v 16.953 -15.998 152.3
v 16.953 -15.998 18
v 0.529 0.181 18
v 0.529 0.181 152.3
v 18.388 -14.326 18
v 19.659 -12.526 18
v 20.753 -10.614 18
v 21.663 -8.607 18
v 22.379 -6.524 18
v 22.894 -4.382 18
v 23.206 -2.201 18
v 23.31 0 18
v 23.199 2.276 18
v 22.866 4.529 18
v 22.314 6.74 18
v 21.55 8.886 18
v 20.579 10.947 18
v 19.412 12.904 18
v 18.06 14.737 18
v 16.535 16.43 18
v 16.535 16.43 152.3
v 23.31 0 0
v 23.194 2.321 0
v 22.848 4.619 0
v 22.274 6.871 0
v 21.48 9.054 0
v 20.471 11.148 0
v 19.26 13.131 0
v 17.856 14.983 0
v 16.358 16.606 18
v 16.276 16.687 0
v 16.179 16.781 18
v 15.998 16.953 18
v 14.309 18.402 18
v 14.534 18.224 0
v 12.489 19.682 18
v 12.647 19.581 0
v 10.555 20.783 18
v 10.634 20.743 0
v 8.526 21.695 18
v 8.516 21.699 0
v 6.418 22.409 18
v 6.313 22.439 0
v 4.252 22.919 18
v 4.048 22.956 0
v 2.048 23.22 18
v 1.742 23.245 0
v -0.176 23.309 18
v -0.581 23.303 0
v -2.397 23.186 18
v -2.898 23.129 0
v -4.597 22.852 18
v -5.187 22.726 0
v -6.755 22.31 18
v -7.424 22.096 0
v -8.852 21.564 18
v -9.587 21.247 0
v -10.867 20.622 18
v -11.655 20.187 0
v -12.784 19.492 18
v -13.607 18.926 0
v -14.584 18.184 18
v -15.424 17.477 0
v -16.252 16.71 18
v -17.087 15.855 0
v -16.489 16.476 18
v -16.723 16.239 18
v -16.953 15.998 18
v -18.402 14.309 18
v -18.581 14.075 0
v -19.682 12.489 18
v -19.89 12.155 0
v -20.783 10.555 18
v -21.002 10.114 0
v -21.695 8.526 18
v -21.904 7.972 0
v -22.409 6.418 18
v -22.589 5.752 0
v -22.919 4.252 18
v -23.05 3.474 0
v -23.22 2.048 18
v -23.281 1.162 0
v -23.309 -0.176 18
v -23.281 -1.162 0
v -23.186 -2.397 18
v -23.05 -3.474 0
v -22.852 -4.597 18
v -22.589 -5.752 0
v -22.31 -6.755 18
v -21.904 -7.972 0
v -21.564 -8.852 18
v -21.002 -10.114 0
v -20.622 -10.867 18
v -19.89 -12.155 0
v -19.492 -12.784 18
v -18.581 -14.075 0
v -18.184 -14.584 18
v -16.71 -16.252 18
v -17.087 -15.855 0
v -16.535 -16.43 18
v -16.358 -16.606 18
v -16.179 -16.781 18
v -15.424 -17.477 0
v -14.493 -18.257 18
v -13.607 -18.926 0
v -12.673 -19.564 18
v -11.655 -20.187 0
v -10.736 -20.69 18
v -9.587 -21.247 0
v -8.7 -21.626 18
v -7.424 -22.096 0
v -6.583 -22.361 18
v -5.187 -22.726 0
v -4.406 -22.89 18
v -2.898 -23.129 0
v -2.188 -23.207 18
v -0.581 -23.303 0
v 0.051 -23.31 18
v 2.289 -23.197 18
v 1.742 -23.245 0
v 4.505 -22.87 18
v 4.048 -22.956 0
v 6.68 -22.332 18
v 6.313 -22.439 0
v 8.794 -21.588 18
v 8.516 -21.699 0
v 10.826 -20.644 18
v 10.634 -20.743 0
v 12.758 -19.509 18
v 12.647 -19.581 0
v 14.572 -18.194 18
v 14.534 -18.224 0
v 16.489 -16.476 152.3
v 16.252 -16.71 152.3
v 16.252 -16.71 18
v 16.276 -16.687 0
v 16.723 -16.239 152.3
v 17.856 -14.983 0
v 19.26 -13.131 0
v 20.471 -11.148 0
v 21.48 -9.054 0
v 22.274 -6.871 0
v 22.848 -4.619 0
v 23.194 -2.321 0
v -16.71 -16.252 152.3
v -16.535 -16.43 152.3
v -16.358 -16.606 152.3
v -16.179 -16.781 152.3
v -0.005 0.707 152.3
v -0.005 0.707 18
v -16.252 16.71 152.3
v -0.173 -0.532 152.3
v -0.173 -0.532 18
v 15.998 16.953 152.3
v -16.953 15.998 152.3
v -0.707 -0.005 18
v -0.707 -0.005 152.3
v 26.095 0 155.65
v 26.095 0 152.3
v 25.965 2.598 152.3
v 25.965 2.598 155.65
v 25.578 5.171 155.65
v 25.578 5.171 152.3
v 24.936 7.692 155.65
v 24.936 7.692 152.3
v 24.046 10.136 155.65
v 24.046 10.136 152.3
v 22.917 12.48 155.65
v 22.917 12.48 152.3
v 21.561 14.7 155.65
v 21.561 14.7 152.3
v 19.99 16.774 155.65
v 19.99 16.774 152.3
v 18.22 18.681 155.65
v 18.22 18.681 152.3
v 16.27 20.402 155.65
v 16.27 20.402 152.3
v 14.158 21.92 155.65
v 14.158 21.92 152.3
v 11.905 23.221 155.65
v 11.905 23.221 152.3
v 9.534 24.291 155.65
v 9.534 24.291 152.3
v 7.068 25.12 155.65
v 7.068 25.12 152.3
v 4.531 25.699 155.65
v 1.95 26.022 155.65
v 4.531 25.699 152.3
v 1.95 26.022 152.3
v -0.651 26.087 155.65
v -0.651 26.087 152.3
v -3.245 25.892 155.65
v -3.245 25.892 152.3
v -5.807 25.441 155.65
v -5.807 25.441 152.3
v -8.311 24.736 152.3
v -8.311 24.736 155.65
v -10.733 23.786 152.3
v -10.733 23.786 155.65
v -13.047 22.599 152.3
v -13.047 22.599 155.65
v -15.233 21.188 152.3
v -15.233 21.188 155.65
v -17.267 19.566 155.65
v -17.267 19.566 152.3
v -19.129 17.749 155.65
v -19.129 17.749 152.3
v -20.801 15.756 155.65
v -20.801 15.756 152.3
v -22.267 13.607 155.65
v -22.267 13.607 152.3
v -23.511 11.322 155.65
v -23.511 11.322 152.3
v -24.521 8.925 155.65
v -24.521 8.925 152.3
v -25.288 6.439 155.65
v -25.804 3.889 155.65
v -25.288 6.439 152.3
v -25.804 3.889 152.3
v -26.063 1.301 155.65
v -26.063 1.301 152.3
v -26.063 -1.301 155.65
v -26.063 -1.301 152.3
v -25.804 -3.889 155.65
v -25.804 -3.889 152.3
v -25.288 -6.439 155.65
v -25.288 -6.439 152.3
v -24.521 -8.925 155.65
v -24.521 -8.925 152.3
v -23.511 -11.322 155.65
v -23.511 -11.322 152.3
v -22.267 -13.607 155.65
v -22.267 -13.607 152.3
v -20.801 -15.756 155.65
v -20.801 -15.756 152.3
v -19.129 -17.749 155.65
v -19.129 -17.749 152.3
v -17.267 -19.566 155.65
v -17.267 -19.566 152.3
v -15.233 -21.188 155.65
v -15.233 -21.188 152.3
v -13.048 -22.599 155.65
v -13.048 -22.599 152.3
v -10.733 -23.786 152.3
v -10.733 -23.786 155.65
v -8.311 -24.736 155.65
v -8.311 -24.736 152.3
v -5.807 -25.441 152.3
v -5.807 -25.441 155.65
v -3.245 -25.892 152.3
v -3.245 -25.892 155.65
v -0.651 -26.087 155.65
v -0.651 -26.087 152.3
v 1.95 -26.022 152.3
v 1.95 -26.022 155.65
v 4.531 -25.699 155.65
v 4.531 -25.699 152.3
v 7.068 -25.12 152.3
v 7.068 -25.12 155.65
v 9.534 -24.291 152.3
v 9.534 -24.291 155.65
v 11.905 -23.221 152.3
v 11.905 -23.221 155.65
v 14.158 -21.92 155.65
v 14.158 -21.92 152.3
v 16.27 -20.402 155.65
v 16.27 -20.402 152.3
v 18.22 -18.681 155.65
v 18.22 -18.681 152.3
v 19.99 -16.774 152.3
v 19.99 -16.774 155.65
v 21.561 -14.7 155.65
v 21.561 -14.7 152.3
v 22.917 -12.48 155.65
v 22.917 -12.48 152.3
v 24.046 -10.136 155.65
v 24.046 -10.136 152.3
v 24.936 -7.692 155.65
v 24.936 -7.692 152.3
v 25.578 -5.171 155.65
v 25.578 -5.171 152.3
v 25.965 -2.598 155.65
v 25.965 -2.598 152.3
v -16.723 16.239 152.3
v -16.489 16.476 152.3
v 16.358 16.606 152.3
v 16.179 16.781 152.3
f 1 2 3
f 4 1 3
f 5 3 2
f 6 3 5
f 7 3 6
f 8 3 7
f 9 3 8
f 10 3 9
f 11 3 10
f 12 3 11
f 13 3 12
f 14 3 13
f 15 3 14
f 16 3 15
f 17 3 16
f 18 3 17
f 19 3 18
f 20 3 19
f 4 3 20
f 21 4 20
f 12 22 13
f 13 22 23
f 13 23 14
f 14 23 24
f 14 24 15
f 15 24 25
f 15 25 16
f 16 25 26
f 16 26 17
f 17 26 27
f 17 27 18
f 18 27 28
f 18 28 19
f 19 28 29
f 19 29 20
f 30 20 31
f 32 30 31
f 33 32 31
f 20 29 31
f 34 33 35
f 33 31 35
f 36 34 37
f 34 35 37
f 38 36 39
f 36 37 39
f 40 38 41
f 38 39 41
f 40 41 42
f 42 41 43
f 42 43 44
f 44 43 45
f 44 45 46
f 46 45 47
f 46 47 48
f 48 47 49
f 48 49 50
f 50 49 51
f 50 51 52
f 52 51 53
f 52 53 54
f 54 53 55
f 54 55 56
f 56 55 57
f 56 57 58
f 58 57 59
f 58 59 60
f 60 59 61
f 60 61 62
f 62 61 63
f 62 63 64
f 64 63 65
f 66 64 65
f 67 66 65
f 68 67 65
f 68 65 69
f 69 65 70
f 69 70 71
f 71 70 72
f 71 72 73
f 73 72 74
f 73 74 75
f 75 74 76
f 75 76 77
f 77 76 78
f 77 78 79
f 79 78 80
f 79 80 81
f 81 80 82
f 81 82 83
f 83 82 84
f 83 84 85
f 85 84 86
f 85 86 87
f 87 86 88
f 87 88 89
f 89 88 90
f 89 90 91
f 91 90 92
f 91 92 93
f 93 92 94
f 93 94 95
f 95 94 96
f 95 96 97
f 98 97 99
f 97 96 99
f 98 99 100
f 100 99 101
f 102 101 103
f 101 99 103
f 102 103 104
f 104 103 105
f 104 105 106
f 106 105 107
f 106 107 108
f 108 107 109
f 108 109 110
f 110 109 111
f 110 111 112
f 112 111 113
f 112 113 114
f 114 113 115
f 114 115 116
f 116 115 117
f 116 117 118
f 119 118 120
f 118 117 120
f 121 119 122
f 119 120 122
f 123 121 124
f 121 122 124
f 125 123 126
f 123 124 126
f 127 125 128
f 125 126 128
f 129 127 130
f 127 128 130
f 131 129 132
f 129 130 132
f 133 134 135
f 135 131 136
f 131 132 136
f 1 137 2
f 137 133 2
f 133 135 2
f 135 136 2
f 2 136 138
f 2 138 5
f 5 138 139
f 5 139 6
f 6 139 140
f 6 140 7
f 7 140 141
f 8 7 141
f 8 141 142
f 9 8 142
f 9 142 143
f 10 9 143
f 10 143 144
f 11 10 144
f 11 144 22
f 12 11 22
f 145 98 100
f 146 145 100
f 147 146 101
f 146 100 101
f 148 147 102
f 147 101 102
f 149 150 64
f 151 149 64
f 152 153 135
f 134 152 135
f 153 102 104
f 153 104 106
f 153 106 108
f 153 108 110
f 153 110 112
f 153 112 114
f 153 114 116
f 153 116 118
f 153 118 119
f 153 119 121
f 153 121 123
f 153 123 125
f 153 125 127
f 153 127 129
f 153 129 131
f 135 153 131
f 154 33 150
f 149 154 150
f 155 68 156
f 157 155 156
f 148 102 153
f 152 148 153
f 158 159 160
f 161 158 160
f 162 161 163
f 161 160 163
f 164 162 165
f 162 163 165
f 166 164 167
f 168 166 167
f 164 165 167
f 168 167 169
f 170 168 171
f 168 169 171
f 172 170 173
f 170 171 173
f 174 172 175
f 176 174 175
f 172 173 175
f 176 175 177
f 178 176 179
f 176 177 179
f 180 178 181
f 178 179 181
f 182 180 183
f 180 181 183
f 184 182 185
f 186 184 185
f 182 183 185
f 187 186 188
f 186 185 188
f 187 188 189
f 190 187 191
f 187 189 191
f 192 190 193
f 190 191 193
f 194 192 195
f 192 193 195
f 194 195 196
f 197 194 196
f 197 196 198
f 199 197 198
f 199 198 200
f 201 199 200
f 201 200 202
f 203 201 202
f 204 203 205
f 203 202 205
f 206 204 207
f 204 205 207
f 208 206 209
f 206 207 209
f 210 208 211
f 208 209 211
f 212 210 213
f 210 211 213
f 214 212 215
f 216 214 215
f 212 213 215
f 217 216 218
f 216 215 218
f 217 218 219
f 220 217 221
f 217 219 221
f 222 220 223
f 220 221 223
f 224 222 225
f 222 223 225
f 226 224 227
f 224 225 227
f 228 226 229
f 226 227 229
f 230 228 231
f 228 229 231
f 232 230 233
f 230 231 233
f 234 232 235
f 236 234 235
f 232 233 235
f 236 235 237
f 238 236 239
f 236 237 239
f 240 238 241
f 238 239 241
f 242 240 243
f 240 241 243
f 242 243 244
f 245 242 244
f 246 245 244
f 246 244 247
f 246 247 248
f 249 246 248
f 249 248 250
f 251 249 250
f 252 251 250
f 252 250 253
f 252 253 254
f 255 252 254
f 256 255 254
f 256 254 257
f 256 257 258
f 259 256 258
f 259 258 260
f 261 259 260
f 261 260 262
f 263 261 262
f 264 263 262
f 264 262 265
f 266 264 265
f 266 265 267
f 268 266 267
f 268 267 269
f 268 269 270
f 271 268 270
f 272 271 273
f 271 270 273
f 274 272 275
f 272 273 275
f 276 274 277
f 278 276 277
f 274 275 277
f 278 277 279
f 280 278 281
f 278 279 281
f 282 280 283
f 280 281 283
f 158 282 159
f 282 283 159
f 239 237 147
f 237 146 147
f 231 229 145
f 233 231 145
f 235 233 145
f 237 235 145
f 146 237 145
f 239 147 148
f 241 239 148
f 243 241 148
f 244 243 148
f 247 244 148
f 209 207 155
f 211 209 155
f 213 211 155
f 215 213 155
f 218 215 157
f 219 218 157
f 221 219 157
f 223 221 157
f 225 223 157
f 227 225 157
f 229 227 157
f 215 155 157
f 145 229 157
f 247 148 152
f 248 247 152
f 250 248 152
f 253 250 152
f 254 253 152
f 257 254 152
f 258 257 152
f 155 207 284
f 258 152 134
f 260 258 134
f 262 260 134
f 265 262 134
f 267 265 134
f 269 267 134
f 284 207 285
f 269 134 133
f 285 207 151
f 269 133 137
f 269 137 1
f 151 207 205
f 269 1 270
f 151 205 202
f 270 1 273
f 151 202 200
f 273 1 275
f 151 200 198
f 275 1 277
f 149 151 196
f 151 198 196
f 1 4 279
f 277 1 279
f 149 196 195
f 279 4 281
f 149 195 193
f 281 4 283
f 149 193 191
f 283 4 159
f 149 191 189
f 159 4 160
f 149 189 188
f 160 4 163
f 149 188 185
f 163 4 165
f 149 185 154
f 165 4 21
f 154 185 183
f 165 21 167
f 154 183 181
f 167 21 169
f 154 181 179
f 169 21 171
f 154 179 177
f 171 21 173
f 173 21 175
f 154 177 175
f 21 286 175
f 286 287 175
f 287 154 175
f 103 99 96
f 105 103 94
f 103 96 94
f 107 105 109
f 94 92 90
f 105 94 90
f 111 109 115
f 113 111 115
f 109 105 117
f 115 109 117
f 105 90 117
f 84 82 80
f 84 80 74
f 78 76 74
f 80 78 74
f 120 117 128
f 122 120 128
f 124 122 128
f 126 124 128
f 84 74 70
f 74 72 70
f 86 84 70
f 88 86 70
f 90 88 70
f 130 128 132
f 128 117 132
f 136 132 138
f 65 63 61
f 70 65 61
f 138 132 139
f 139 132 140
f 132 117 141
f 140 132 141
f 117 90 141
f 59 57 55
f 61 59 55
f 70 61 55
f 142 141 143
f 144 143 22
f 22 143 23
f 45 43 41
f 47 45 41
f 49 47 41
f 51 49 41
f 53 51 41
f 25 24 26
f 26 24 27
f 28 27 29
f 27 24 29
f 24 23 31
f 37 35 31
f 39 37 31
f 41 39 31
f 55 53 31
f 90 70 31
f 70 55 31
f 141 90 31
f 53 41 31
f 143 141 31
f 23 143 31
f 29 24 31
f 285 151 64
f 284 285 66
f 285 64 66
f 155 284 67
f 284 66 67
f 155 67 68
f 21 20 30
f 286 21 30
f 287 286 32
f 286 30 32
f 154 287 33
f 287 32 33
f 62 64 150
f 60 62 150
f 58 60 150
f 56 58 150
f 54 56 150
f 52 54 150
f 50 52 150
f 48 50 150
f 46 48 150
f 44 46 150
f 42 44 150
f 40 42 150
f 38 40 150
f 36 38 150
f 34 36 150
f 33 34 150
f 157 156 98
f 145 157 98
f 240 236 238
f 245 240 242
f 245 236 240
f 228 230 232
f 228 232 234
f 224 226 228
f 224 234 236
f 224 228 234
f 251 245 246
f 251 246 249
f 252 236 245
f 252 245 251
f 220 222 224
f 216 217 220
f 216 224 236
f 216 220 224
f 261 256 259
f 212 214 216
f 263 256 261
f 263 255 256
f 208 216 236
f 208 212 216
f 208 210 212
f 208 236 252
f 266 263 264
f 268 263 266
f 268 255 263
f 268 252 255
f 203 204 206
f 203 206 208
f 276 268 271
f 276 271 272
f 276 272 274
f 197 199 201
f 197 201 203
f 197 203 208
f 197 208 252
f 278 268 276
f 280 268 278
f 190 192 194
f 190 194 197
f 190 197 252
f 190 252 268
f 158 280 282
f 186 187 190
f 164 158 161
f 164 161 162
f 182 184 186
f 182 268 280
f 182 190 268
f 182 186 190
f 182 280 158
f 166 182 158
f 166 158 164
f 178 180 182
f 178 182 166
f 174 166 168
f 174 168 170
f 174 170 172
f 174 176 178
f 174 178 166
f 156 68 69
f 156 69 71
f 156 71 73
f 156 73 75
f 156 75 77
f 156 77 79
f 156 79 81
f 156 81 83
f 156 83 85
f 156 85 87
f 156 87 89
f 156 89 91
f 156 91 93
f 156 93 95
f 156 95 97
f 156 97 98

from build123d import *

# Parameters (mm, degrees)
SKETCH1_R           = 23.31
BOSS_EXTRUDE1_DEPTH = 15
SKETCH2_R           = 23.31
BOSS_EXTRUDE2_DEPTH = 3
BOSS_EXTRUDE5_DEPTH = 134.3
SKETCH4_OUTSIDE_W   = 81.812
SKETCH4_OUTSIDE_H   = 81.812
SKETCH4_OUTSIDE_R   = 23.31
CUT_EXTRUDE2_DEPTH  = 204
SKETCH5_R           = 26.095
BOSS_EXTRUDE6_DEPTH = 3.35


with BuildPart() as part:
    # Sketch1 → Boss-Extrude1 (new body)
    with BuildSketch(Plane.XY):
        Circle(SKETCH1_R)
    extrude(amount=BOSS_EXTRUDE1_DEPTH)

    # Sketch2 → Boss-Extrude2 (add)
    with BuildSketch(Plane.XY.offset(15)):
        Circle(SKETCH2_R)
    extrude(amount=BOSS_EXTRUDE2_DEPTH)

    # Sketch3 → Boss-Extrude5 (add)
    with BuildSketch(Plane.XY.offset(18)):
        with BuildLine():
            Line((-19.00086471, 19.418454901), (-19.738244764, 18.741128654))
            Line((-19.738244764, 18.741128654), (-0.707086702, -0.005328765))
            Line((-0.707086702, -0.005328765), (-16.710421631, -16.2517048))
            ThreePointArc((-16.710421631, -16.2517048), (-16.44680571, -16.518434609), (-16.178932822, -16.780888914))
            Line((-16.178932822, -16.780888914), (-0.172775102, -0.531647218))
            Line((-0.172775102, -0.531647218), (20.92357267, -21.312399704))
            Line((20.92357267, -21.312399704), (21.625330607, -20.599984237))
            Line((21.625330607, -20.599984237), (0.528982835, 0.180768249))
            Line((0.528982835, 0.180768249), (16.535140556, 16.430009945))
            ThreePointArc((16.535140556, 16.430009945), (16.26867879, 16.693896801), (15.998006164, 16.953462737))
            Line((15.998006164, 16.953462737), (-0.005328765, 0.707086702))
            Line((-0.005328765, 0.707086702), (-19.00086471, 19.418454901))
        make_face()
    extrude(amount=BOSS_EXTRUDE5_DEPTH)

    # Sketch4 outside → Cut-Extrude2 (cut)
    with BuildSketch(Plane.XY.offset(18)):
        Rectangle(SKETCH4_OUTSIDE_W, SKETCH4_OUTSIDE_H)
        with Locations(Location((0, 0, 0), (0, 0, 136.660875724))):
            Circle(SKETCH4_OUTSIDE_R, mode=Mode.SUBTRACT)
    extrude(amount=CUT_EXTRUDE2_DEPTH, mode=Mode.SUBTRACT)

    # Sketch5 → Boss-Extrude6 (add)
    with BuildSketch(Plane.XY.offset(152.3)):
        Circle(SKETCH5_R)
    extrude(amount=BOSS_EXTRUDE6_DEPTH)


solid = part.part
